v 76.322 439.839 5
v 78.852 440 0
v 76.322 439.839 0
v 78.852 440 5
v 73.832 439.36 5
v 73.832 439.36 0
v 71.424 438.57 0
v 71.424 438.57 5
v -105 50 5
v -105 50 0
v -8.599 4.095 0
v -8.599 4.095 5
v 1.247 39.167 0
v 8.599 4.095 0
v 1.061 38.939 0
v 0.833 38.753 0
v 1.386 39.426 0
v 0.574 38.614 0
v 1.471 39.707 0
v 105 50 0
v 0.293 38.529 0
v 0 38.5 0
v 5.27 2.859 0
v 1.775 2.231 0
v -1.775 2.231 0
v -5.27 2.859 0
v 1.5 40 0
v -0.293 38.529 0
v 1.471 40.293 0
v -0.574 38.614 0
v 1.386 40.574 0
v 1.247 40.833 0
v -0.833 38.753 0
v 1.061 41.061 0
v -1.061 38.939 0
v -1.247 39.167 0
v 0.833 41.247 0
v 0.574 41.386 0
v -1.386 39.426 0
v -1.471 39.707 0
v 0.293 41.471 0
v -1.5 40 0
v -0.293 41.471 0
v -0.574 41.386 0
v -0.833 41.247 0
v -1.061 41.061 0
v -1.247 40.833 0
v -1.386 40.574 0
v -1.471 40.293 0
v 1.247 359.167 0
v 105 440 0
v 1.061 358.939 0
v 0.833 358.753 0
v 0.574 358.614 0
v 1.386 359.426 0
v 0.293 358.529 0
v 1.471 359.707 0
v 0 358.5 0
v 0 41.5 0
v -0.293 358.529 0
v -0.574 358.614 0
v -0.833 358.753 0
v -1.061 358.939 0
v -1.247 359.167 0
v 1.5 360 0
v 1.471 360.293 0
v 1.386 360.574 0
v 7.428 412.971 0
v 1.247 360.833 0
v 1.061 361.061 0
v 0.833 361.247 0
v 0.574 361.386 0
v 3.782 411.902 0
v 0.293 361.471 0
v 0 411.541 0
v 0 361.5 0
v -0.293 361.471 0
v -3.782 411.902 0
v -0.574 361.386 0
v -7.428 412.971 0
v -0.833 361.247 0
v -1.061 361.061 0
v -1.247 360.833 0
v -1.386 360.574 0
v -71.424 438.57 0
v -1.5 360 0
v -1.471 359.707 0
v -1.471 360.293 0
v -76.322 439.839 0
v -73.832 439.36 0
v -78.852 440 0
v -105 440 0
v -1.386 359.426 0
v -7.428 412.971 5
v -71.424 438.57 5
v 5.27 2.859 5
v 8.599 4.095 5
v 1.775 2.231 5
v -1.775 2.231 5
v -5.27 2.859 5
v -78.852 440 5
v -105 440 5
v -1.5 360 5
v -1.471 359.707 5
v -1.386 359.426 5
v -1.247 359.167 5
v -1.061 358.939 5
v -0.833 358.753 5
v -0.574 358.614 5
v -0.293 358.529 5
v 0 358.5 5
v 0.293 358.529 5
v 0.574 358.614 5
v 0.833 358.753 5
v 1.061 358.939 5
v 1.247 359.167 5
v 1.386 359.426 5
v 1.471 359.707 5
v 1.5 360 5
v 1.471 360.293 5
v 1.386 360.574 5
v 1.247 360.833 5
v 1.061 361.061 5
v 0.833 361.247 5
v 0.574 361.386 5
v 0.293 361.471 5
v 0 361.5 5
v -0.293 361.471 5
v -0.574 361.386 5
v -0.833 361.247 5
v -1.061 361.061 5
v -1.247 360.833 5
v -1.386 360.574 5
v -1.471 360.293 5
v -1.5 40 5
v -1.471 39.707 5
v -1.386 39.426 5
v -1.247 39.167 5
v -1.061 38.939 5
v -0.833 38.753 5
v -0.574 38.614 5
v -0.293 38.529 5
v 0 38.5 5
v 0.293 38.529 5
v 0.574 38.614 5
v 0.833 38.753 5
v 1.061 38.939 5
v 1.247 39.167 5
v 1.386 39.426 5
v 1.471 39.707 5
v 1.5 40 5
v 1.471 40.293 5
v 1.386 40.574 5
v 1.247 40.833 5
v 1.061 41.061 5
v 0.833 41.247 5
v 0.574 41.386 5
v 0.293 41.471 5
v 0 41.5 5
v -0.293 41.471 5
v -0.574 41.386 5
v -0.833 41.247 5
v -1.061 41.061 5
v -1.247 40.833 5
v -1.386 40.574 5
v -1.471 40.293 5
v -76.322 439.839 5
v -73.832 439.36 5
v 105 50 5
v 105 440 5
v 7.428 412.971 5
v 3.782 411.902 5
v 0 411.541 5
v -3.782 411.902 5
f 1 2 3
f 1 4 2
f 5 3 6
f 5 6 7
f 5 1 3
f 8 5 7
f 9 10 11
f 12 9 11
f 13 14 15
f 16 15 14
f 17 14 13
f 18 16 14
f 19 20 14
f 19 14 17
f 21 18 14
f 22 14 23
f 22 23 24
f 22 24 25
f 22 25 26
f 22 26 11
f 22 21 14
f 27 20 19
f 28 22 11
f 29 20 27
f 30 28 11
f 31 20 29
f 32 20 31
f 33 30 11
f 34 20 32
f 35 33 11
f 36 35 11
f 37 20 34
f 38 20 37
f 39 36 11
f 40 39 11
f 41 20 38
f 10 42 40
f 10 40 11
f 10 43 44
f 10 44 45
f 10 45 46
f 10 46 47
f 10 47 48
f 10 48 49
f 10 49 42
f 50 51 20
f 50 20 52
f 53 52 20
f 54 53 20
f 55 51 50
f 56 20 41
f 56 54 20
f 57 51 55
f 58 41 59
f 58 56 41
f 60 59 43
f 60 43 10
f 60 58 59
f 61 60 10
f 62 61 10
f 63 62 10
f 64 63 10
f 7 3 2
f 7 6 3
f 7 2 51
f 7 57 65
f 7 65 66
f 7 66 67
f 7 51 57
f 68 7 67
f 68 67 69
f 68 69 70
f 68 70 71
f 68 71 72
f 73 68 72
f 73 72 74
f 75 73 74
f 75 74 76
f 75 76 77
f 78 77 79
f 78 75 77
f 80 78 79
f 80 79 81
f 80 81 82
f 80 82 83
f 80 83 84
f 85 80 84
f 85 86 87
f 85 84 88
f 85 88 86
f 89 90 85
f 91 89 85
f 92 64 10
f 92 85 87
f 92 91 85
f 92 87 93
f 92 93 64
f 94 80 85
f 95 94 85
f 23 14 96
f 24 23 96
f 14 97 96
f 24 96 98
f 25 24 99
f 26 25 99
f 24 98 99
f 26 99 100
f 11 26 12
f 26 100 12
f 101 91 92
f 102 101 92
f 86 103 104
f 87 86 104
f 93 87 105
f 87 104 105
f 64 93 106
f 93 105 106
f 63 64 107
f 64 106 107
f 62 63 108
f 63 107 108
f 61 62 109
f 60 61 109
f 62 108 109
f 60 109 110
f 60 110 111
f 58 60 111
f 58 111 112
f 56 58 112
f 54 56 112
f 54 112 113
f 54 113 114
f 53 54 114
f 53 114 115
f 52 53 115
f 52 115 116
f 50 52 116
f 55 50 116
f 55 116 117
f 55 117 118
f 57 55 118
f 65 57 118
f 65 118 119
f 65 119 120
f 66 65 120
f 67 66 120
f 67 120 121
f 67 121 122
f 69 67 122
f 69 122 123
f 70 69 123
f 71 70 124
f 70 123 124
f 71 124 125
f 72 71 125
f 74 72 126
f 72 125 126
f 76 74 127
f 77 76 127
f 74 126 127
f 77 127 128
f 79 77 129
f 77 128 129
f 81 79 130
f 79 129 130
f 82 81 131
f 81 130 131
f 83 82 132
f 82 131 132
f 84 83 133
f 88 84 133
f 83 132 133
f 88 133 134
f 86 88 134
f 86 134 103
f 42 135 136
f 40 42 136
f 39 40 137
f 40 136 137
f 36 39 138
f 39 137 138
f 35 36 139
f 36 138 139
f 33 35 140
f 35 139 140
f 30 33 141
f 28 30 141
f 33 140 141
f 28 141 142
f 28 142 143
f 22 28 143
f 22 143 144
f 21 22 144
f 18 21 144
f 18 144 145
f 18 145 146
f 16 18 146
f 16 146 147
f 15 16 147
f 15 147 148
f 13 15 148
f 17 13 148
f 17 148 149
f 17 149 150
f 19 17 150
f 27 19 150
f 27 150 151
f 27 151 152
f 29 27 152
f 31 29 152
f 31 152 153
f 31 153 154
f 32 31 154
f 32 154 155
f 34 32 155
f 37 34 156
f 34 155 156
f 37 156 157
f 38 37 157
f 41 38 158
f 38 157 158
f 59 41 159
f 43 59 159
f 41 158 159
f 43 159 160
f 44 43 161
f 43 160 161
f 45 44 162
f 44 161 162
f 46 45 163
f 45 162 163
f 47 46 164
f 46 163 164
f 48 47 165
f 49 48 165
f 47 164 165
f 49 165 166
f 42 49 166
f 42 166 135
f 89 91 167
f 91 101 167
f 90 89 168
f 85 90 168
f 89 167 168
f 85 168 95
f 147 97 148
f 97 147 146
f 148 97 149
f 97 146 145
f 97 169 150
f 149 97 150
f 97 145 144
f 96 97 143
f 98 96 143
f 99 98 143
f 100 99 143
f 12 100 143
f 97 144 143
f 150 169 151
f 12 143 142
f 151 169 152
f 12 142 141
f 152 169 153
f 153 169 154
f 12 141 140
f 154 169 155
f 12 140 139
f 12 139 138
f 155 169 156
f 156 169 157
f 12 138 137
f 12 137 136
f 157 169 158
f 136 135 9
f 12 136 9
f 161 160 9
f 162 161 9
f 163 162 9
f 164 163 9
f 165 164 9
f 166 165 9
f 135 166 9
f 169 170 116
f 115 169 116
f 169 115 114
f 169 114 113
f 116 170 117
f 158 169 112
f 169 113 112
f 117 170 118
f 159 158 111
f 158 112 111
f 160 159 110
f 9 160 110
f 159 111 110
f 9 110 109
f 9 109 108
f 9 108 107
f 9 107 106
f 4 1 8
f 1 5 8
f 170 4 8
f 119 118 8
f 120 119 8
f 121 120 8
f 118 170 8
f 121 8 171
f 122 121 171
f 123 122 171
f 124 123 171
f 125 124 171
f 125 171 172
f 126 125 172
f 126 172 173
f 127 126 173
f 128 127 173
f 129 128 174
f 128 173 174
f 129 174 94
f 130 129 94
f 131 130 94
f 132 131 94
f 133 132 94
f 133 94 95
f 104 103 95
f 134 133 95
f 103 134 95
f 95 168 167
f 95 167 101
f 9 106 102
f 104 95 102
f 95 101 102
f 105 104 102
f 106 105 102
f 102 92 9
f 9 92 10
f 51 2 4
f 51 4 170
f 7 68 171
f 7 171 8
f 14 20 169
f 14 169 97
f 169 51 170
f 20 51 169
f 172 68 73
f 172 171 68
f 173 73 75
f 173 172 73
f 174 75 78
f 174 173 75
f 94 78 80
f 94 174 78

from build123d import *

# Parameters (mm, degrees)
F1_DEPTH = 5
F3_R     = 20
F4_D     = 3


with BuildPart() as f1:
    # F0 (on Top) → F1 (new body)
    with BuildSketch(Plane.XY):
        Polygon((-105, 50), (0, 0), (0, 410), (-75, 440), (-105, 440), align=None)
    extrude(amount=F1_DEPTH)

    # F2: F1 across plane


with BuildPart() as f1_1:
    add(f1.part)
    add(f1.part.mirror(Plane.YZ))

    # F3
    f3_edges = [f1_1.edges().sort_by_distance(p)[0] for p in [
        (0, 0, 2.5),
        (0, 410, 2.5),
        (75, 440, 2.5),
        (-75, 440, 2.5),
    ]]
    fillet(f3_edges, radius=F3_R)

    # F4 (through all)
    with Locations(Plane(origin=(0, 0, 0), x_dir=(1, 0, 0), z_dir=(0, 0, -1))):
        with Locations((0, -360), (0, -40)):
            Hole(F4_D / 2)


solid = f1_1.part
